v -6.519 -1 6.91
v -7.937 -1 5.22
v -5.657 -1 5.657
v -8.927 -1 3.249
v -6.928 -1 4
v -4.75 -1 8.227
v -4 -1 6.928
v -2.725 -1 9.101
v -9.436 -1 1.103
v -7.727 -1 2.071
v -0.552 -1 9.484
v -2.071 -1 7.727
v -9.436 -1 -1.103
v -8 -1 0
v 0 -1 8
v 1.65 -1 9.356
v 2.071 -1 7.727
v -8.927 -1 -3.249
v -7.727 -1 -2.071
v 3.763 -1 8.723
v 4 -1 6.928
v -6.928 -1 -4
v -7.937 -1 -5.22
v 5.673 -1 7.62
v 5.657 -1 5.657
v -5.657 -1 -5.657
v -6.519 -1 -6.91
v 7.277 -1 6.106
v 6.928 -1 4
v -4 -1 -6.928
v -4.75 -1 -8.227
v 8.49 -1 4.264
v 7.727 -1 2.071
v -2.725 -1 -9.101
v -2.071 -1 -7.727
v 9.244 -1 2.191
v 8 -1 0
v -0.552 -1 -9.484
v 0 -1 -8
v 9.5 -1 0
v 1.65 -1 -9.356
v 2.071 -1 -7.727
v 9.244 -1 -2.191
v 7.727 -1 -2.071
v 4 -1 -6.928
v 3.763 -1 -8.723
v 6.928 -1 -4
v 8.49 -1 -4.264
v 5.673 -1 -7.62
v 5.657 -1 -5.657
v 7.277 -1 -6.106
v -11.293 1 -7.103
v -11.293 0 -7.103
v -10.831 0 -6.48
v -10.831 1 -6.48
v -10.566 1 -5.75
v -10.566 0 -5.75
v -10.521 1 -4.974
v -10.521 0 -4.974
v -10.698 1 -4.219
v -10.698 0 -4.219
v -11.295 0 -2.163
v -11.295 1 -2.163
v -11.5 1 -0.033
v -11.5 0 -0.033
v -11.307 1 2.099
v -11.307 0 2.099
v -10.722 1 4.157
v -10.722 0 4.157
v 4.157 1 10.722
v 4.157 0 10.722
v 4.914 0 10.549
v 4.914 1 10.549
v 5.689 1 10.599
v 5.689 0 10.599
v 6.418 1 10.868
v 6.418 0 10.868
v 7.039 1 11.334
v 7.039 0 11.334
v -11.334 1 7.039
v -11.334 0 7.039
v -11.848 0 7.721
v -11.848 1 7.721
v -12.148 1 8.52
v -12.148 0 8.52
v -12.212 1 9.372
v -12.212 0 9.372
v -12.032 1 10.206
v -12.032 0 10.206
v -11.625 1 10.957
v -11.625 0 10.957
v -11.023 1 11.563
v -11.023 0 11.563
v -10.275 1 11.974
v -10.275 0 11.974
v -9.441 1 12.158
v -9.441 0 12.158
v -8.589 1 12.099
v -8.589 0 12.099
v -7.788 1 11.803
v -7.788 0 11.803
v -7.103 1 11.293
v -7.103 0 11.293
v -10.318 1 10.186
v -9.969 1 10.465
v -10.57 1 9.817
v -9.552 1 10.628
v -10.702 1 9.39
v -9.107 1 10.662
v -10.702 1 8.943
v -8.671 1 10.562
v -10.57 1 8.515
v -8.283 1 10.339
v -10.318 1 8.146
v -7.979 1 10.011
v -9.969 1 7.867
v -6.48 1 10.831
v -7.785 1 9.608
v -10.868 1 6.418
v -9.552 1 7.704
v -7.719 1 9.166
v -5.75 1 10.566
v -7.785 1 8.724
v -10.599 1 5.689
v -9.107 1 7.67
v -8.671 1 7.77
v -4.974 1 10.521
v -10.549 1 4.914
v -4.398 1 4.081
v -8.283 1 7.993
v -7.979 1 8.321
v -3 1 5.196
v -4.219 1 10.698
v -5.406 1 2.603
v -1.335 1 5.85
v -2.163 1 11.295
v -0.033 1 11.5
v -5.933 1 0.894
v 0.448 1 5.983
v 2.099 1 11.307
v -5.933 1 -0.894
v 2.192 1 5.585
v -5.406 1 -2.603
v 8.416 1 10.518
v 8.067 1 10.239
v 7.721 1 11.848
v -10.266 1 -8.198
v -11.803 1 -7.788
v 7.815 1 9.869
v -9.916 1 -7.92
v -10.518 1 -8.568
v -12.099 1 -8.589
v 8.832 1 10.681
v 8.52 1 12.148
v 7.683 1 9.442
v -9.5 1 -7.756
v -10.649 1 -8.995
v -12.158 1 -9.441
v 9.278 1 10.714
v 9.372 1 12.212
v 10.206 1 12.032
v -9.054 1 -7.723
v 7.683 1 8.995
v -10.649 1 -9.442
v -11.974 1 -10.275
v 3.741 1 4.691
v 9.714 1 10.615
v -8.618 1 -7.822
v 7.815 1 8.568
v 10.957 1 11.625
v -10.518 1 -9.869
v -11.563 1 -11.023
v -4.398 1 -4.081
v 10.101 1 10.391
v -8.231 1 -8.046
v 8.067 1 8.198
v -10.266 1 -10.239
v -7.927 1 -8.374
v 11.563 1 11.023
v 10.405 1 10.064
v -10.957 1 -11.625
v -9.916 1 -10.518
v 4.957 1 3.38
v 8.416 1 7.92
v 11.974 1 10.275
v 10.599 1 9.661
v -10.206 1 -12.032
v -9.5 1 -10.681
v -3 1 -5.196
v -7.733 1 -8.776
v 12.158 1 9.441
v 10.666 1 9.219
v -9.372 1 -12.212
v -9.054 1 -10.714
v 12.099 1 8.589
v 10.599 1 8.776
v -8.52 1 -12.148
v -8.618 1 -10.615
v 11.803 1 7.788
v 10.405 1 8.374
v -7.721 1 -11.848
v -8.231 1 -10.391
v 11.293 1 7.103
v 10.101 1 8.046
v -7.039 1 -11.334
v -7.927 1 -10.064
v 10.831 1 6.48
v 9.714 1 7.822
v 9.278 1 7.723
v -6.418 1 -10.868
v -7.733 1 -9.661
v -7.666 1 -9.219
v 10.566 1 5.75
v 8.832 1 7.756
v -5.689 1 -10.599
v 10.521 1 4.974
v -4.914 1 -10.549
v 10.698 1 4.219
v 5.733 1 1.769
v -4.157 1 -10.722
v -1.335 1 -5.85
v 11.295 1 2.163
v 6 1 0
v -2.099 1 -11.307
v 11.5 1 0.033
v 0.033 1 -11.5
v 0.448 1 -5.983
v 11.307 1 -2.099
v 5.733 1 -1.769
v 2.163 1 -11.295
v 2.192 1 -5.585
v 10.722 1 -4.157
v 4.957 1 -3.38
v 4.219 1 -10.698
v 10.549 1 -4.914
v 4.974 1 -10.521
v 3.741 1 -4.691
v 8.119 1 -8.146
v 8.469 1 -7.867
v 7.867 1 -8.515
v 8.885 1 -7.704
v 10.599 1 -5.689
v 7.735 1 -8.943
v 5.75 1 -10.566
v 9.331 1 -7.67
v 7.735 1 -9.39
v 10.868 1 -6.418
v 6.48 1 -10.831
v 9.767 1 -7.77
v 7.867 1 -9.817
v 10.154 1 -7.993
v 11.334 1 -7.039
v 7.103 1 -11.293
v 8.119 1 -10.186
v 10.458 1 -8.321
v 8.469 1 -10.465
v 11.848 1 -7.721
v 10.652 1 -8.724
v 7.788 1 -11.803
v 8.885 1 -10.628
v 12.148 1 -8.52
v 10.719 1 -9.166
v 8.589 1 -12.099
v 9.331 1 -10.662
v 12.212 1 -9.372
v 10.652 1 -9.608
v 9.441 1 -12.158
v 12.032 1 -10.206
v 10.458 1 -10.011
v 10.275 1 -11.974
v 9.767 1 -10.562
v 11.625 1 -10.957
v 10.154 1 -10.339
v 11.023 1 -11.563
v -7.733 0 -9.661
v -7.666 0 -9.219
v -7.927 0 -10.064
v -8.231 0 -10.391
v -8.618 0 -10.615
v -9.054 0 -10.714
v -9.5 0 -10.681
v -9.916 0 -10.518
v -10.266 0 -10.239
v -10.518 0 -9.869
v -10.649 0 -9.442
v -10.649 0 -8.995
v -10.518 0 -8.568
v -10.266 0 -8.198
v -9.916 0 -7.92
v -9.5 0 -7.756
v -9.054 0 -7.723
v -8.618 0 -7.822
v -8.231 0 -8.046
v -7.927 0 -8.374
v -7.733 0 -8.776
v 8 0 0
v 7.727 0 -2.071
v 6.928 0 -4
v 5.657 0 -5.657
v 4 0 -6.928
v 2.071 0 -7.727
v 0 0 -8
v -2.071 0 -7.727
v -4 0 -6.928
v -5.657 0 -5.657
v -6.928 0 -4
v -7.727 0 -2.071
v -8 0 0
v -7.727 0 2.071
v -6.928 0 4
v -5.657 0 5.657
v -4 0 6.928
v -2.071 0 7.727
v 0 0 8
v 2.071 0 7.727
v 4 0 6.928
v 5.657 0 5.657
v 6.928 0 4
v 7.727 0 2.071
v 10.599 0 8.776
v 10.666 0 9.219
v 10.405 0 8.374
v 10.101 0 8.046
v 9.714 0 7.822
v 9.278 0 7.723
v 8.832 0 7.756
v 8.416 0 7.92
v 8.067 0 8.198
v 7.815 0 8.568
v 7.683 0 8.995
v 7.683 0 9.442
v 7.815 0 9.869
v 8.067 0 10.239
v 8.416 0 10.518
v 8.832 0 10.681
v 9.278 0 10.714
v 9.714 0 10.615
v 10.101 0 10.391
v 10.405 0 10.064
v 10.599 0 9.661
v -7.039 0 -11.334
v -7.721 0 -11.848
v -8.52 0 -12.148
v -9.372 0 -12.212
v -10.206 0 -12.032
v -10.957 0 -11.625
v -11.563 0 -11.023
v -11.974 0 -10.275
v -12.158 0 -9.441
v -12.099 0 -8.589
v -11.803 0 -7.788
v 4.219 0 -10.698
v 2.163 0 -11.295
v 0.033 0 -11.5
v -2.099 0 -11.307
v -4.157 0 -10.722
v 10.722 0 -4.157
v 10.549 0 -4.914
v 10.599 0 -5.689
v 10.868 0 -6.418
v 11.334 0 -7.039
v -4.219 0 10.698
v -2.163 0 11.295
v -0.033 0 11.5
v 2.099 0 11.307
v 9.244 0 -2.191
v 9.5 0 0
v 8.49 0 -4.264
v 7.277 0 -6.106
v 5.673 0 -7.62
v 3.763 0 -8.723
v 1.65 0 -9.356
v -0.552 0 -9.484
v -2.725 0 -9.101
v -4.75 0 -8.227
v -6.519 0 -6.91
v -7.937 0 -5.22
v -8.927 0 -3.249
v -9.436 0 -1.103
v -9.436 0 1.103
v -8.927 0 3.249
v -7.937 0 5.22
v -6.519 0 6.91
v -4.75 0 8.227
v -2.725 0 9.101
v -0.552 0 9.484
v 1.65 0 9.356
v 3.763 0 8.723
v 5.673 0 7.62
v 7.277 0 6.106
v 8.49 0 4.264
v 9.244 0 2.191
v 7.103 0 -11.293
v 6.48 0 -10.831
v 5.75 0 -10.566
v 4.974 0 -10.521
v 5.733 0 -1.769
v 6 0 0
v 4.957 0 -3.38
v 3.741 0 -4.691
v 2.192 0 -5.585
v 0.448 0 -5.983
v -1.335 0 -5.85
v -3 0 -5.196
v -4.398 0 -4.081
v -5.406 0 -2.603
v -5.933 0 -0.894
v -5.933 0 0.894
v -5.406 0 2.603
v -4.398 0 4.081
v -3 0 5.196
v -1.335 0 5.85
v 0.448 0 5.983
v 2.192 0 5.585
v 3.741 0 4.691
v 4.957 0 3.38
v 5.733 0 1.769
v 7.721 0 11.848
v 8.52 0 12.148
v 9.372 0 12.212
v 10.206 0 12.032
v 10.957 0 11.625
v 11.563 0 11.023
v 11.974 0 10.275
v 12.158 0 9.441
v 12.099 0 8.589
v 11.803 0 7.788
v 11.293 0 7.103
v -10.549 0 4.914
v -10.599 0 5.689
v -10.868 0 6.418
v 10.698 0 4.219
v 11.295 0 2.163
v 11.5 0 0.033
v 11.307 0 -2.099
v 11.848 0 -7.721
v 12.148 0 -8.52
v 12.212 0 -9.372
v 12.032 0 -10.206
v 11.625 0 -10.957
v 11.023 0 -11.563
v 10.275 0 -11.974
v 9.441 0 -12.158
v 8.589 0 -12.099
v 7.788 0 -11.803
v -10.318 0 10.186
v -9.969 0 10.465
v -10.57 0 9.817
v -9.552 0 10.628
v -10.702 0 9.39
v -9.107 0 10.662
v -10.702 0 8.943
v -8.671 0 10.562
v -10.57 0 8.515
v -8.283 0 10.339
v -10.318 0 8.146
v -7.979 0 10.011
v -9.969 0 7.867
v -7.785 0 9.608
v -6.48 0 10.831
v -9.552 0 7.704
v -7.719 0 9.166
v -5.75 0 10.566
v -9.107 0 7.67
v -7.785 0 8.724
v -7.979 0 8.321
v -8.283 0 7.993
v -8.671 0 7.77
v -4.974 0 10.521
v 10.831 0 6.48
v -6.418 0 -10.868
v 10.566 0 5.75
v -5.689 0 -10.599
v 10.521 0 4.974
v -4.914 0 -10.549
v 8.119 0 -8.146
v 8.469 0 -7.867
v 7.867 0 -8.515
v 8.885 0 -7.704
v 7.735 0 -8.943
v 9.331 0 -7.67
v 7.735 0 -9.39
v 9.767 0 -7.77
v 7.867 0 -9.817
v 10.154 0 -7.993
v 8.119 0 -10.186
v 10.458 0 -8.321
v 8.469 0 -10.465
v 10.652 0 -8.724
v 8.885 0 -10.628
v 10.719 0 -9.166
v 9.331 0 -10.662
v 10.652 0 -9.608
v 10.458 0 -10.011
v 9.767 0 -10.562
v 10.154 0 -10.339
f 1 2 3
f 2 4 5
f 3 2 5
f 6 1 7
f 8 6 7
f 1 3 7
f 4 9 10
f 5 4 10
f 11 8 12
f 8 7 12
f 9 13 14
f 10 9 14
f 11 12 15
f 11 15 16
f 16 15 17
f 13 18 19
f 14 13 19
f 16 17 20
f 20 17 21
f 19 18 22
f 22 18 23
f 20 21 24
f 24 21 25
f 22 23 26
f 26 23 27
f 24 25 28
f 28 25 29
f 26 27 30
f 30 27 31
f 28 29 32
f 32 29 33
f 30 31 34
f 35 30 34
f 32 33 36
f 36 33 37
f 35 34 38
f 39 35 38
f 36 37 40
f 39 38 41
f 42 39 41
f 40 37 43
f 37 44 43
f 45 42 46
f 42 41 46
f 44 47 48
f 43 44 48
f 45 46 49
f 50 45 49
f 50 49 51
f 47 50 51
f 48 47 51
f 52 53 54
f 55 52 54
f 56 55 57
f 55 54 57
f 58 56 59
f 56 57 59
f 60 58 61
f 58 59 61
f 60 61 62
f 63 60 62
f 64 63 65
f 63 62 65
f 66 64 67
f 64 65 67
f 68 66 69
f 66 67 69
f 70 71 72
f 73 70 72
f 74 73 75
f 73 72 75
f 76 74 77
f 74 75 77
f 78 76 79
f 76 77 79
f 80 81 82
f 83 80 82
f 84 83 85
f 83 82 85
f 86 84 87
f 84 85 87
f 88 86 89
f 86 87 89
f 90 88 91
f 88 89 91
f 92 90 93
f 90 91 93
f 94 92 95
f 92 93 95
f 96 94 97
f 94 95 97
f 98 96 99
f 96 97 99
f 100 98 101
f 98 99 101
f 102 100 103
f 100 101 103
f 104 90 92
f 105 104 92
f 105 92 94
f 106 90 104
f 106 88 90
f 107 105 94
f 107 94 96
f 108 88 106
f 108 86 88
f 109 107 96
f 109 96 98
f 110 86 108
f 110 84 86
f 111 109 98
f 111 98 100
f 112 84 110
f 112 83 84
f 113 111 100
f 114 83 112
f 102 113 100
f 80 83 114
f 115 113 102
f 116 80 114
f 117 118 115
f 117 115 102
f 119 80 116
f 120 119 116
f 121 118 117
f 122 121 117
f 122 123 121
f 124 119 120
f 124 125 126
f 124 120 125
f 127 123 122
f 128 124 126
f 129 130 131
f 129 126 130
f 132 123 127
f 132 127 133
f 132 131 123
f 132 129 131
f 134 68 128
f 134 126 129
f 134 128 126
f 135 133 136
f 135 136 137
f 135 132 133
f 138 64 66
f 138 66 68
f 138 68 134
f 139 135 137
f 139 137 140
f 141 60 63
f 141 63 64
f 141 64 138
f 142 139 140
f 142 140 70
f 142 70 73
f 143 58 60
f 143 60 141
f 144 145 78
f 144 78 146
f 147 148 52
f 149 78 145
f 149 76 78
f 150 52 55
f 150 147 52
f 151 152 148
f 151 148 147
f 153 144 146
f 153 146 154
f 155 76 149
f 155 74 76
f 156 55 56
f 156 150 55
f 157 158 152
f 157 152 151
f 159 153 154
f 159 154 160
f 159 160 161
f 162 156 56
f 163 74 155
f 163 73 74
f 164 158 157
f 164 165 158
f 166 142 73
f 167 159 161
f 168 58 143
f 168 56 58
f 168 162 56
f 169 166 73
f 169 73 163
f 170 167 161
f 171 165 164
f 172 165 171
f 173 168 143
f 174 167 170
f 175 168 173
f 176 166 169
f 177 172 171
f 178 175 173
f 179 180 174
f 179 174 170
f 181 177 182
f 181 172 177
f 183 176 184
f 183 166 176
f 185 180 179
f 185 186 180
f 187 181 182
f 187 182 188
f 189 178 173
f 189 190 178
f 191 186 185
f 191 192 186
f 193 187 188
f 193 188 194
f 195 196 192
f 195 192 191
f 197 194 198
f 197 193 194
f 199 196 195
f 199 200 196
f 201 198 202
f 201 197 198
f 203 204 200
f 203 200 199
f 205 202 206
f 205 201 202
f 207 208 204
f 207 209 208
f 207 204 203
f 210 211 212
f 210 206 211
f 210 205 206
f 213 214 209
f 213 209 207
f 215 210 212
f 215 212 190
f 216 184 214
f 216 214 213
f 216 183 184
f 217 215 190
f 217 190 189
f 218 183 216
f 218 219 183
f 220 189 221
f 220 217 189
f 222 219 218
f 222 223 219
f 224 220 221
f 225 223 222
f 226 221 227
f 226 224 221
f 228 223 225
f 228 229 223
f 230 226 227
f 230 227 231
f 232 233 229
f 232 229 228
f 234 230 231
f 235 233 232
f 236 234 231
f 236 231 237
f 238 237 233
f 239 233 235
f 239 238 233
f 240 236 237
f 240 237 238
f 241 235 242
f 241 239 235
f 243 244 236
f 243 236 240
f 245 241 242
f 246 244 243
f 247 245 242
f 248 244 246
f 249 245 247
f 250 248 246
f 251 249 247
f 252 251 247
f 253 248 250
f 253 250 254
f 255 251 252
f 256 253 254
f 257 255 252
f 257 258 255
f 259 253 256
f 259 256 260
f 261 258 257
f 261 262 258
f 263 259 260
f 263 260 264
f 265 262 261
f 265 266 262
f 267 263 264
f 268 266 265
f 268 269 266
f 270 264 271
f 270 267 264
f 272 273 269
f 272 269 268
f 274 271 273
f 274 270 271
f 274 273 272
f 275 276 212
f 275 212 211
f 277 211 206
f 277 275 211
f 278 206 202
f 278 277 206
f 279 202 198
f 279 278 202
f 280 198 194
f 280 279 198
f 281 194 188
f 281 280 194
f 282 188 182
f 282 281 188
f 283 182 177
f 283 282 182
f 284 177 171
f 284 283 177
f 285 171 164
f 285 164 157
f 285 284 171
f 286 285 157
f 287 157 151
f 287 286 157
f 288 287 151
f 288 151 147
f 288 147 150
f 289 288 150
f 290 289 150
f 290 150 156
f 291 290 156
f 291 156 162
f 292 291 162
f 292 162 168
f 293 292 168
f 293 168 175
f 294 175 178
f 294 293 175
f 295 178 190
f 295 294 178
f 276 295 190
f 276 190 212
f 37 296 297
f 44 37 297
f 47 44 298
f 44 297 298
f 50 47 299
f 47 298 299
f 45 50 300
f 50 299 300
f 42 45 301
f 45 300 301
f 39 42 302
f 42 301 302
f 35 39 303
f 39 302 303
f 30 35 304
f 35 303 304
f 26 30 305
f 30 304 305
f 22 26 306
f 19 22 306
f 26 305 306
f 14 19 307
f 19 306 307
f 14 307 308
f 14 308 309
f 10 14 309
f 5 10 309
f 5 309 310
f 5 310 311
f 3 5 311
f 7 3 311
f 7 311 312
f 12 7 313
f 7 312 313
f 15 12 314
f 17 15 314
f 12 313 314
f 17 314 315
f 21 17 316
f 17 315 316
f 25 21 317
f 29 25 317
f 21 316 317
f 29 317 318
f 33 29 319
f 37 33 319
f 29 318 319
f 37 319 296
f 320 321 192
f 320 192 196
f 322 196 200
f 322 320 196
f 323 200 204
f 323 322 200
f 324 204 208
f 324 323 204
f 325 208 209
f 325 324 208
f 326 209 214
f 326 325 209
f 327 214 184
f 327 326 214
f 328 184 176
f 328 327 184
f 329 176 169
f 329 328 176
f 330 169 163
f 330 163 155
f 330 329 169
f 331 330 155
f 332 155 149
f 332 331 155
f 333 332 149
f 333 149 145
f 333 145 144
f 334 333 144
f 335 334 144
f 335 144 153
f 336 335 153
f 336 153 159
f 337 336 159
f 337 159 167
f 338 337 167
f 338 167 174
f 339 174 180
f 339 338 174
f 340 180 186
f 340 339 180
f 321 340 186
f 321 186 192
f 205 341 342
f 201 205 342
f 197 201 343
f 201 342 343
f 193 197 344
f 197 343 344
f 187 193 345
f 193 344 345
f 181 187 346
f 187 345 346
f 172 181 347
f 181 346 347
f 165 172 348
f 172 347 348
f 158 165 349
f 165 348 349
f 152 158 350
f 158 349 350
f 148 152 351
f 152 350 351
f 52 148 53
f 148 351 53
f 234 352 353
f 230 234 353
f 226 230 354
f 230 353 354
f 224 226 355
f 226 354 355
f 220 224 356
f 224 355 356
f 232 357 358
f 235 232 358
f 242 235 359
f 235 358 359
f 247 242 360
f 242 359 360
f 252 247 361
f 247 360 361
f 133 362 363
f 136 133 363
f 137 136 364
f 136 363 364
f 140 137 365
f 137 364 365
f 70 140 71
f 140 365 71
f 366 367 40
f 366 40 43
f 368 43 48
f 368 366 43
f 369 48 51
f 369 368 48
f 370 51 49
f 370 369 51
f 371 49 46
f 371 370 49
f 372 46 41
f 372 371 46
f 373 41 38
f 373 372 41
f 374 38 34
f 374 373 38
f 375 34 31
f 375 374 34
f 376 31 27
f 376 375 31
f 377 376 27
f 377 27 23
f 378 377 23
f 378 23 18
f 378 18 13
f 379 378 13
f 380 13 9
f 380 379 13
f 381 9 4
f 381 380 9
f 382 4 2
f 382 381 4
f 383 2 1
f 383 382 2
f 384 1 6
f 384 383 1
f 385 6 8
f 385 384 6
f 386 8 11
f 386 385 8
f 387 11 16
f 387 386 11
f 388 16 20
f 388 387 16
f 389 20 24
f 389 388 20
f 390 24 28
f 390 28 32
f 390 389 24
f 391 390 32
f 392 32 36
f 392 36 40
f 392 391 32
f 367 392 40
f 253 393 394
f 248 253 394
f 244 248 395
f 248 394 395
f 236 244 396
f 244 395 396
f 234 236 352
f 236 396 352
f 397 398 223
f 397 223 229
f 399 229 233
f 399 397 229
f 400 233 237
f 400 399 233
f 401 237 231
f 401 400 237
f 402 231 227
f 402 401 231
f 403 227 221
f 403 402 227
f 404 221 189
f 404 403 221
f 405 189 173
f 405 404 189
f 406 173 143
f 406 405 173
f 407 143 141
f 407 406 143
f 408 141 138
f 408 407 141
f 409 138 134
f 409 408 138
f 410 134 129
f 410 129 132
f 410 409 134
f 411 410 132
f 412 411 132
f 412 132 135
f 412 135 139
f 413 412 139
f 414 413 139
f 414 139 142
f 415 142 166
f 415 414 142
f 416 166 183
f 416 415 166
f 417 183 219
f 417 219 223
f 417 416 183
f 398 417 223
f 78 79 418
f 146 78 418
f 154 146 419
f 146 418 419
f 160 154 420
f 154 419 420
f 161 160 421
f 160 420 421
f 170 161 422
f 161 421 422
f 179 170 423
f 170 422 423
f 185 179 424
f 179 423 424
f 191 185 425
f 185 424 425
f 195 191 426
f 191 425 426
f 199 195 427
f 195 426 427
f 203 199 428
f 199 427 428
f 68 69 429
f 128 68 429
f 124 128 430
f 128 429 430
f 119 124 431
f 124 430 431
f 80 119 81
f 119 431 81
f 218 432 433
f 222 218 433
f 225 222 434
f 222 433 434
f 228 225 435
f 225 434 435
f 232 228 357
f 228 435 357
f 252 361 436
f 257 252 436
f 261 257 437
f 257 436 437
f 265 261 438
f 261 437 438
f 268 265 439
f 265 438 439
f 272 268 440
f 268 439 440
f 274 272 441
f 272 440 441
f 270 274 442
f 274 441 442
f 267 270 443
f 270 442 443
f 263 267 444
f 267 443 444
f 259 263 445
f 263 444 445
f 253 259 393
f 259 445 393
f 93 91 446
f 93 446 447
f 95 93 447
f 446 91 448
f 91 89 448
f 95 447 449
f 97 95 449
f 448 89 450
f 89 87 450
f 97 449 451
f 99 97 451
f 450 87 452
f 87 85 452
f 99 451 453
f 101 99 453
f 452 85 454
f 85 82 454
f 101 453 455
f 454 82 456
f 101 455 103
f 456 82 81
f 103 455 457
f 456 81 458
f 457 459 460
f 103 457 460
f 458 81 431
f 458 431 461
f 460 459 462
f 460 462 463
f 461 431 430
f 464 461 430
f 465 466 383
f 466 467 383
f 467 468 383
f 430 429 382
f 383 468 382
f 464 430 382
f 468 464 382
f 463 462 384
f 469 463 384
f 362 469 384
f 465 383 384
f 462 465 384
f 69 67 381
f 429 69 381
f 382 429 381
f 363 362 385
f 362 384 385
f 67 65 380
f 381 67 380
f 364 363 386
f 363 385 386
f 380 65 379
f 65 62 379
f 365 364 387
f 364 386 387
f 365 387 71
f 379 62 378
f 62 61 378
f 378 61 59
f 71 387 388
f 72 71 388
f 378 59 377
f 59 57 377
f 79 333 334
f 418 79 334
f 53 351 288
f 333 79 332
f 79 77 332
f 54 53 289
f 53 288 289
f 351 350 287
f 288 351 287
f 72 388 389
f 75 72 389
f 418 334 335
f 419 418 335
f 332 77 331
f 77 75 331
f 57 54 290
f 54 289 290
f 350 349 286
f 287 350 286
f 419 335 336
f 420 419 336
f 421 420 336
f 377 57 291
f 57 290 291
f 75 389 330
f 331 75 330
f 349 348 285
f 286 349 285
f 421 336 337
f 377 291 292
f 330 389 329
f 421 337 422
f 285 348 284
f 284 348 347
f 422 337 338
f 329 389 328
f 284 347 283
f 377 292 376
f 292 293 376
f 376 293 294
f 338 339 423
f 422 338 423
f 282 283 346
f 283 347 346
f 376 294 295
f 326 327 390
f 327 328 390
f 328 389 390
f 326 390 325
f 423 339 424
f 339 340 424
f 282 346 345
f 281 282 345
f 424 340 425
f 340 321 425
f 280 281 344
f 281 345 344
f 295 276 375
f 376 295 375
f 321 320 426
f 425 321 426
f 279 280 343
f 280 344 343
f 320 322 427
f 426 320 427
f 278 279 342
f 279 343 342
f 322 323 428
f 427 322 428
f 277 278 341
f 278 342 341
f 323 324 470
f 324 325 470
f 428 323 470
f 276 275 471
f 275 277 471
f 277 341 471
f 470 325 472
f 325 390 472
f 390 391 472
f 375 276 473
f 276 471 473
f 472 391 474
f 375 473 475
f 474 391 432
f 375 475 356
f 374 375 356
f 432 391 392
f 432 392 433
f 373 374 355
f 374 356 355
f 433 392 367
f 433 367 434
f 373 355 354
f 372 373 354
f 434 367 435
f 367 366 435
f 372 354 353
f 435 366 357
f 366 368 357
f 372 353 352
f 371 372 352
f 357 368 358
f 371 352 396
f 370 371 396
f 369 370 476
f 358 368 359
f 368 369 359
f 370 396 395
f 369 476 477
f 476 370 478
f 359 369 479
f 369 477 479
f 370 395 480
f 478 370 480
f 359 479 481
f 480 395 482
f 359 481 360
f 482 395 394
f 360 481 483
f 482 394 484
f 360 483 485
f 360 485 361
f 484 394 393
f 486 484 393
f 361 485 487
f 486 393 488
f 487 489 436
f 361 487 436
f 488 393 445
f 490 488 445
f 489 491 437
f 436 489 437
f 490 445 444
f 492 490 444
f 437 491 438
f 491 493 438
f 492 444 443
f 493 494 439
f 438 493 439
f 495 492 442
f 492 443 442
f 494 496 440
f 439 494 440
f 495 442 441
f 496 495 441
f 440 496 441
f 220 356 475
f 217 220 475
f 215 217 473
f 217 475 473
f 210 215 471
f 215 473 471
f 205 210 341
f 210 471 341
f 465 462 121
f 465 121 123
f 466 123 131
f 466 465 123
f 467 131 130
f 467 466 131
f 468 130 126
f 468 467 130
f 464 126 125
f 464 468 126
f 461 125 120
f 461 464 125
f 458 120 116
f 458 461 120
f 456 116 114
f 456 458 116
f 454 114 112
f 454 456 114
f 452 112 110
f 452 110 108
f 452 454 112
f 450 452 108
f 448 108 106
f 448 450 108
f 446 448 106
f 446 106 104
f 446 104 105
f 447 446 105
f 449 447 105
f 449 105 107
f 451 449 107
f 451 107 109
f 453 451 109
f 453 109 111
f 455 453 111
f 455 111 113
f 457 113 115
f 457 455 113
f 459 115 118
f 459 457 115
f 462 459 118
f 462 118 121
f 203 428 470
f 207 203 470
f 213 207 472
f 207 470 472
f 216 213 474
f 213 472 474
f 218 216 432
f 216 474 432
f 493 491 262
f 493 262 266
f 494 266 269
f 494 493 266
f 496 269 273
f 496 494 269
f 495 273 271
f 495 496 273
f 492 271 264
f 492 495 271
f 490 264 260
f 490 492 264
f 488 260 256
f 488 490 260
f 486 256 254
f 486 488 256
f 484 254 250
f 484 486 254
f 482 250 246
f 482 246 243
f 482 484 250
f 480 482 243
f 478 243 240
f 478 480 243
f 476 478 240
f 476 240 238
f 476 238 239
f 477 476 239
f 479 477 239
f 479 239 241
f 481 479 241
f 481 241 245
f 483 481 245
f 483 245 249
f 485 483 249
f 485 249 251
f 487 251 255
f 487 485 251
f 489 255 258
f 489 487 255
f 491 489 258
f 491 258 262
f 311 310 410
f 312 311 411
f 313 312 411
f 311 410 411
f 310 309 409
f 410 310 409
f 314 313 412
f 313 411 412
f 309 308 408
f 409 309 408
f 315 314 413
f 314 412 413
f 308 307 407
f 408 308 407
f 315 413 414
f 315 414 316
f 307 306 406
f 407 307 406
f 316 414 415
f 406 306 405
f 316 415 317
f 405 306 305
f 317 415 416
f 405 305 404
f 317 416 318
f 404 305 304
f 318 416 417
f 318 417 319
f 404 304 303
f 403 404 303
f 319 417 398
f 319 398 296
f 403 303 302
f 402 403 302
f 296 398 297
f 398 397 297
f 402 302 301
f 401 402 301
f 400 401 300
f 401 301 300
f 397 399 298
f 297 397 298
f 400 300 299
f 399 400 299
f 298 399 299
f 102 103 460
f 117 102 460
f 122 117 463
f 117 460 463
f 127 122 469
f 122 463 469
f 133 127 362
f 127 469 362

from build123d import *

# Parameters (mm, degrees)
SKETCH1_R           = 6
SKETCH1_R_2         = 1.5
BOSS_EXTRUDE1_DEPTH = 1
SKETCH3_R           = 9.5
SKETCH3_R_2         = 8
BOSS_EXTRUDE2_DEPTH = 1


with BuildPart() as part:
    # Sketch1 → Boss-Extrude1 (new body)
    with BuildSketch(Plane(origin=(0, 0, 0), x_dir=(1, 0, 0), z_dir=(0, 1, 0))):
        with BuildLine():
            ThreePointArc((10.722201854, 4.157449627), (10.598848399, 5.689199117), (11.333854237, 7.038731997))
            ThreePointArc((11.333854237, 7.038731997), (11.345969357, 11.281355386), (7.103345968, 11.293470506))
            ThreePointArc((7.103345968, 11.293470506), (5.749637406, 10.566183969), (4.218617379, 10.698283386))
            ThreePointArc((4.218617379, 10.698283386), (0.032838952, 11.499953113), (-4.157449627, 10.722201854))
            ThreePointArc((-4.157449627, 10.722201854), (-5.689199117, 10.598848399), (-7.038731997, 11.333854237))
            ThreePointArc((-7.038731997, 11.333854237), (-11.281355386, 11.345969357), (-11.293470506, 7.103345968))
            ThreePointArc((-11.293470506, 7.103345968), (-10.566183969, 5.749637406), (-10.698283386, 4.218617379))
            ThreePointArc((-10.698283386, 4.218617379), (-11.499953113, 0.032838952), (-10.722201854, -4.157449627))
            ThreePointArc((-10.722201854, -4.157449627), (-10.598848399, -5.689199117), (-11.333854237, -7.038731997))
            ThreePointArc((-11.333854237, -7.038731997), (-11.345969357, -11.281355386), (-7.103345968, -11.293470506))
            ThreePointArc((-7.103345968, -11.293470506), (-5.749637406, -10.566183969), (-4.218617379, -10.698283386))
            ThreePointArc((-4.218617379, -10.698283386), (-0.032838952, -11.499953113), (4.157449627, -10.722201854))
            ThreePointArc((4.157449627, -10.722201854), (5.689199117, -10.598848399), (7.038731997, -11.333854237))
            ThreePointArc((7.038731997, -11.333854237), (11.281355386, -11.345969357), (11.293470506, -7.103345968))
            ThreePointArc((11.293470506, -7.103345968), (10.566183969, -5.749637406), (10.698283386, -4.218617379))
            ThreePointArc((10.698283386, -4.218617379), (11.499953113, -0.032838952), (10.722201854, 4.157449627))
        make_face()
        Circle(SKETCH1_R, mode=Mode.SUBTRACT)
        with Locations((9.218600102, 9.166101251)):
            Circle(SKETCH1_R_2, mode=Mode.SUBTRACT)
        with Locations((9.166101251, -9.218600102)):
            Circle(SKETCH1_R_2, mode=Mode.SUBTRACT)
        with Locations((-9.166101251, 9.218600102)):
            Circle(SKETCH1_R_2, mode=Mode.SUBTRACT)
        with Locations((-9.218600102, -9.166101251)):
            Circle(SKETCH1_R_2, mode=Mode.SUBTRACT)
    extrude(amount=BOSS_EXTRUDE1_DEPTH)

    # Sketch3 → Boss-Extrude2 (add)
    with BuildSketch(Plane(origin=(0, 0, 0), x_dir=(1, 0, 0), z_dir=(0, 1, 0))):
        Circle(SKETCH3_R)
        Circle(SKETCH3_R_2, mode=Mode.SUBTRACT)
    extrude(amount=-BOSS_EXTRUDE2_DEPTH)


solid = part.part
